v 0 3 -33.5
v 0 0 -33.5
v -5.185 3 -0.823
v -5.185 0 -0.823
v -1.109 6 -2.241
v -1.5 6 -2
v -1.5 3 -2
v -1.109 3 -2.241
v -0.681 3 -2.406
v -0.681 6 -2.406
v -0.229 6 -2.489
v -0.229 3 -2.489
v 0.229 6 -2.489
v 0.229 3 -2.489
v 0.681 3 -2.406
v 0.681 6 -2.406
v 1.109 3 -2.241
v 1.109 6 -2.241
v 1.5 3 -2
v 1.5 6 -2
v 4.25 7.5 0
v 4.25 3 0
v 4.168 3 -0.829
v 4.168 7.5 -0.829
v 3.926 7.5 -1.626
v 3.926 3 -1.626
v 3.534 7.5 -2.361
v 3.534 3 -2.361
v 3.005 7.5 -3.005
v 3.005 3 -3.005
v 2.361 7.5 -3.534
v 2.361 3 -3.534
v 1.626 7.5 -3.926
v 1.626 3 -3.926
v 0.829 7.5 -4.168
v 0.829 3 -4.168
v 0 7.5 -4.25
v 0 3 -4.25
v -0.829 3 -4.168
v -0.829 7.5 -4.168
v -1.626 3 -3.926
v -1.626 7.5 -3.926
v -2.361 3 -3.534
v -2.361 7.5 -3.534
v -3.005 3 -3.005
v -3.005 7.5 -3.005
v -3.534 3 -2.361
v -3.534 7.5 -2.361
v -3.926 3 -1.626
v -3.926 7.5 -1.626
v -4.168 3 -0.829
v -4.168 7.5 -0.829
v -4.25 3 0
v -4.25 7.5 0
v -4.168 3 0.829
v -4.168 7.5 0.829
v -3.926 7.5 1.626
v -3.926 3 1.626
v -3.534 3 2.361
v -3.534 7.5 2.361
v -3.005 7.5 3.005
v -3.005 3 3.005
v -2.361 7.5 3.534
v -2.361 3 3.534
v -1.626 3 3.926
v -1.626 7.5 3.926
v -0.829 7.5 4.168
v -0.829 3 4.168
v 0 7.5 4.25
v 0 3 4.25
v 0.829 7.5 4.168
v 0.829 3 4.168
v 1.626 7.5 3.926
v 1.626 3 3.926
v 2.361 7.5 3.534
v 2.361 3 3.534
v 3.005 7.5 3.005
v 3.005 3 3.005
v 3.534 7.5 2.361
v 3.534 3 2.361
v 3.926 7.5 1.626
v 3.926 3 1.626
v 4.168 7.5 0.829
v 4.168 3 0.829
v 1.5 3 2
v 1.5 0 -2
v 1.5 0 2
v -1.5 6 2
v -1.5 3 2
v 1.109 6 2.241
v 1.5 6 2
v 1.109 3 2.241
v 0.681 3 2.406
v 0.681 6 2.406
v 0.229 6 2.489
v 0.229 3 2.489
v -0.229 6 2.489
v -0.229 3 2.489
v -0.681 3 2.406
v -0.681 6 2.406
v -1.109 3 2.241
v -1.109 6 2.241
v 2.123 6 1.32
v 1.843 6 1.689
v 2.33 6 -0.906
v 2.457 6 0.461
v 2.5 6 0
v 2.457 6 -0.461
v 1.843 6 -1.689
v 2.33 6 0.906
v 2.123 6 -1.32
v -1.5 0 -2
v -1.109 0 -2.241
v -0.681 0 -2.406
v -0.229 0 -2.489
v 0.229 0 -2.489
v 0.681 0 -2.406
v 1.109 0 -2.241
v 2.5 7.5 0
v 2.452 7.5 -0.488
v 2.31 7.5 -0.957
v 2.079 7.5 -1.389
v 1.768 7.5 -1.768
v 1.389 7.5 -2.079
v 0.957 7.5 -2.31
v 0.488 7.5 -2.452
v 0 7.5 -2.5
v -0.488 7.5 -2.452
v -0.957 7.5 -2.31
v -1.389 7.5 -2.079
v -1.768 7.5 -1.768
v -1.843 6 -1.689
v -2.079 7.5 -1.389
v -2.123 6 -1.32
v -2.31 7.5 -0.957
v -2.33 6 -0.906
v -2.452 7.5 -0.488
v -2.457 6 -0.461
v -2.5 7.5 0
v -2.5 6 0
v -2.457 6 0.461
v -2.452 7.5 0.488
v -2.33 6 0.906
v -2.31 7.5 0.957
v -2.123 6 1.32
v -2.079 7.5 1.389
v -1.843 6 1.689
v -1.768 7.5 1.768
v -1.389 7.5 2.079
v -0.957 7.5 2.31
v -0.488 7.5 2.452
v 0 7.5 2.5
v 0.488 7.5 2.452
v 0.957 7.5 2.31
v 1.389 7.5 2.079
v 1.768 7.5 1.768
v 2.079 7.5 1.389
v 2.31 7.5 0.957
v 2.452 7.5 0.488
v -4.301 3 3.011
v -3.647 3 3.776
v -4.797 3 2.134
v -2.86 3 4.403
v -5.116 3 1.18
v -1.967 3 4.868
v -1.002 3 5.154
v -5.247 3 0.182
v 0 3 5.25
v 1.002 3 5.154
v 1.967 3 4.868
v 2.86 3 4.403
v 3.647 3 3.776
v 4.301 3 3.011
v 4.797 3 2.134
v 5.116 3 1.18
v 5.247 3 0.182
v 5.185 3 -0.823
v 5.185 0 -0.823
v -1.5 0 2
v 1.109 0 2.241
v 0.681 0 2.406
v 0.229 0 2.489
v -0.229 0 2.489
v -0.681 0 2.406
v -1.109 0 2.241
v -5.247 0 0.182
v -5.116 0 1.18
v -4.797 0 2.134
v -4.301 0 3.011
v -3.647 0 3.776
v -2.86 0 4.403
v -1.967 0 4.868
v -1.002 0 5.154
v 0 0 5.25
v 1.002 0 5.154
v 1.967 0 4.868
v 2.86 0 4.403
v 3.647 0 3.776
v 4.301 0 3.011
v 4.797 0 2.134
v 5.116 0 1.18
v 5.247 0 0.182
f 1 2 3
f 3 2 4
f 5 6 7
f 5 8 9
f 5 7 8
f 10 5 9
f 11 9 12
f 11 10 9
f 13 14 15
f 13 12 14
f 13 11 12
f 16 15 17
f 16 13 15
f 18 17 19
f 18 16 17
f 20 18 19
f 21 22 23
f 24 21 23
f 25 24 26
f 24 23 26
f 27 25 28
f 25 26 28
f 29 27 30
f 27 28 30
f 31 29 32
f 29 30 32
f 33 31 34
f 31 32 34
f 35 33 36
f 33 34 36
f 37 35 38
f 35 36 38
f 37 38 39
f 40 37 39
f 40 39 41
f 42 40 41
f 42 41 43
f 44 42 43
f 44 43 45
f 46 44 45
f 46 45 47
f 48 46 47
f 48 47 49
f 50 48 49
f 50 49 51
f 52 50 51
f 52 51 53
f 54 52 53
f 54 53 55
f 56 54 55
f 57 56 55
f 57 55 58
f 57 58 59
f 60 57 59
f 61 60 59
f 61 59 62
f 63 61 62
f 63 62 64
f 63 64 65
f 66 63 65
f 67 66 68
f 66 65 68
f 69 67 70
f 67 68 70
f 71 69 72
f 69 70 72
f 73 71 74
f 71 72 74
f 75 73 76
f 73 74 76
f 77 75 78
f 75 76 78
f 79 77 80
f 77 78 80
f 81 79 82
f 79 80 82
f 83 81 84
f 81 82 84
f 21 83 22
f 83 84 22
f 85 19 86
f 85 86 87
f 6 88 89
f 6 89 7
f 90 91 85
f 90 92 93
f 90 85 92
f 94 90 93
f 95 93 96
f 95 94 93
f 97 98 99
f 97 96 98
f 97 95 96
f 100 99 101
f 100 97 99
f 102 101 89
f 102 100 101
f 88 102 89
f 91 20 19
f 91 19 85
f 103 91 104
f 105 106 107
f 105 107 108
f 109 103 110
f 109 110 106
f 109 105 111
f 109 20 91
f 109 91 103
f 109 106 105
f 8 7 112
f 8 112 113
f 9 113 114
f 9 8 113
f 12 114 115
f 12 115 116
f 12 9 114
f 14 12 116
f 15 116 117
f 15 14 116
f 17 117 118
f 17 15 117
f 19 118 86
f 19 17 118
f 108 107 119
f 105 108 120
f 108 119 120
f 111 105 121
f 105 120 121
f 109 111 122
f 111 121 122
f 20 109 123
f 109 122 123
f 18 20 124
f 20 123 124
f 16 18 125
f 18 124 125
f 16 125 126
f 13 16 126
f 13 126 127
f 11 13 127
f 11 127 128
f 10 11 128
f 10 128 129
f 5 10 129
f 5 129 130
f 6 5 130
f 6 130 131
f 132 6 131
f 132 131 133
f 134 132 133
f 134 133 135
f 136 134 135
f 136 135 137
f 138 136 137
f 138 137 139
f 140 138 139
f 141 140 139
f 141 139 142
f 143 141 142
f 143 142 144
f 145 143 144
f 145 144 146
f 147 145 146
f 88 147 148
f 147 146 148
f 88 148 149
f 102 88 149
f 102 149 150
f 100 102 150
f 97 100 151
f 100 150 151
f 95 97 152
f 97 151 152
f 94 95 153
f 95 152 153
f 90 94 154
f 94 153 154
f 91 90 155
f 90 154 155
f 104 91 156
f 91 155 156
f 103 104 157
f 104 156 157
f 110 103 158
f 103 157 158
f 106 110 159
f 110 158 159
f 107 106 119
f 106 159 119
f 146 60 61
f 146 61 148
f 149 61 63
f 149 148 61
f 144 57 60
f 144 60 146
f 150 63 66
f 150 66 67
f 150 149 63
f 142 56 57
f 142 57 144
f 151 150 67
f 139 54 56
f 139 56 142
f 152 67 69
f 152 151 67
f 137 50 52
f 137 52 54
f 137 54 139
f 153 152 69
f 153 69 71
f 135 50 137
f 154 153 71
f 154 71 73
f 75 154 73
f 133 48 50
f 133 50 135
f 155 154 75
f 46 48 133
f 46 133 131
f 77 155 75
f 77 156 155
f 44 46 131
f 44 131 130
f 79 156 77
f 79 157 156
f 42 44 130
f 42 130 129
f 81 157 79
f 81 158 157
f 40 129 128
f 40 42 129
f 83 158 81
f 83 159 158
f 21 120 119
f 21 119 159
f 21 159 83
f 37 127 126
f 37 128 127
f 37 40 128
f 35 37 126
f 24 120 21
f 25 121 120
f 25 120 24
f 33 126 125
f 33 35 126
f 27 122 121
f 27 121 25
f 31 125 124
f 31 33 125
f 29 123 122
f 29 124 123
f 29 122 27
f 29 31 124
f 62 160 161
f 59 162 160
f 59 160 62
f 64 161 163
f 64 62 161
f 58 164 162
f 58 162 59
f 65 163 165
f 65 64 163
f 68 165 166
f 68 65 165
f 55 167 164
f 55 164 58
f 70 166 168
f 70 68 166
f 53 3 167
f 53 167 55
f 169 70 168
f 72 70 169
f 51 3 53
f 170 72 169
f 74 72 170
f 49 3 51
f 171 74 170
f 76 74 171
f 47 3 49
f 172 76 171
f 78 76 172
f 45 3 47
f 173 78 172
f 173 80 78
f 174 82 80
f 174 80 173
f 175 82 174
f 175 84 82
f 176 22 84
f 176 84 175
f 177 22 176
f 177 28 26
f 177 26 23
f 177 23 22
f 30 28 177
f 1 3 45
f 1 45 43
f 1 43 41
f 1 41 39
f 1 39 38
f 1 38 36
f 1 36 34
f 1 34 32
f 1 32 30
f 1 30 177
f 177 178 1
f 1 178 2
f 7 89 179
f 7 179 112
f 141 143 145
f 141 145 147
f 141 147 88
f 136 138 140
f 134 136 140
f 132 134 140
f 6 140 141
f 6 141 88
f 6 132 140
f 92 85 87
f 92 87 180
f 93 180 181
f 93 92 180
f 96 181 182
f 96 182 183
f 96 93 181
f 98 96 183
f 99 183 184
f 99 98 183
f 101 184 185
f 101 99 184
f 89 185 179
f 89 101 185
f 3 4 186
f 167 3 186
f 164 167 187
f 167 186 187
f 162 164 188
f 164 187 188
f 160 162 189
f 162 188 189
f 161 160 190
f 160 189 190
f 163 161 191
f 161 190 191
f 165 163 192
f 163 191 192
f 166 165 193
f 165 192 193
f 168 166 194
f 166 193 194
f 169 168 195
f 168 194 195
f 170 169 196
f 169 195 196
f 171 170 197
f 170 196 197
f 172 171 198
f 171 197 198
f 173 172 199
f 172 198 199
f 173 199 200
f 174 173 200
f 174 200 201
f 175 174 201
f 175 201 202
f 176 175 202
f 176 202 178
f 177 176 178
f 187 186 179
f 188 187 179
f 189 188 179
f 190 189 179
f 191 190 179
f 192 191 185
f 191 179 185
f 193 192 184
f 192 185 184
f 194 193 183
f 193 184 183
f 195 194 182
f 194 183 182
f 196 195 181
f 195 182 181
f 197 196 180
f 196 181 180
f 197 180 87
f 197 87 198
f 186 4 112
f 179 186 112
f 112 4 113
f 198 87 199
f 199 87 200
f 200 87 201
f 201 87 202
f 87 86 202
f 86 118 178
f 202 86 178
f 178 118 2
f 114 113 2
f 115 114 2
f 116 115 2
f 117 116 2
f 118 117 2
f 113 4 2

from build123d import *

# Parameters (mm, degrees)
SKETCH5_R           = 4.25
BOSS_EXTRUDE3_DEPTH = 7.5
SKETCH7_R           = 2.5
CUT_EXTRUDE2_DEPTH  = 1.5
CUT_EXTRUDE3_DEPTH  = 6
SKETCH9_R           = 5.25
BOSS_EXTRUDE4_DEPTH = 3


with BuildPart() as part:
    # Sketch5 → Boss-Extrude3 (new body)
    with BuildSketch(Plane(origin=(0, 0, 0), x_dir=(1, 0, 0), z_dir=(0, 1, 0))):
        Circle(SKETCH5_R)
    extrude(amount=BOSS_EXTRUDE3_DEPTH)

    # Sketch7 → Cut-Extrude2 (cut)
    with BuildSketch(Plane(origin=(0, 7.5, 0), x_dir=(1, 0, 0), z_dir=(0, 1, 0))):
        Circle(SKETCH7_R)
    extrude(amount=-CUT_EXTRUDE2_DEPTH, mode=Mode.SUBTRACT)

    # Sketch8 → Cut-Extrude3 (cut)
    with BuildSketch(Plane(origin=(0, 6, 0), x_dir=(1, 0, 0), z_dir=(0, 1, 0))):
        with BuildLine():
            Line((-1.5, -2), (-1.5, 2))
            ThreePointArc((-1.5, 2), (0, 2.5), (1.5, 2))
            Line((1.5, 2), (1.5, -2))
            ThreePointArc((1.5, -2), (0, -2.5), (-1.5, -2))
        make_face()
    extrude(amount=-CUT_EXTRUDE3_DEPTH, mode=Mode.SUBTRACT)

    # Sketch9 → Boss-Extrude4 (add)
    with BuildSketch(Plane(origin=(0, 0, 0), x_dir=(1, 0, 0), z_dir=(0, 1, 0))):
        with BuildLine():
            Line((0, 33.5), (-5.185129123, 0.822761194))
            ThreePointArc((-5.185129123, 0.822761194), (0, 5.25), (5.185129123, 0.822761194))
            Line((5.185129123, 0.822761194), (0, 33.5))
        make_face()
        Circle(SKETCH9_R)
        with BuildLine():
            ThreePointArc((1.5, 2), (0, 2.5), (-1.5, 2))
            Line((-1.5, 2), (-1.5, -2))
            ThreePointArc((-1.5, -2), (0, -2.5), (1.5, -2))
            Line((1.5, -2), (1.5, 2))
        make_face(mode=Mode.SUBTRACT)
    extrude(amount=BOSS_EXTRUDE4_DEPTH)


solid = part.part
